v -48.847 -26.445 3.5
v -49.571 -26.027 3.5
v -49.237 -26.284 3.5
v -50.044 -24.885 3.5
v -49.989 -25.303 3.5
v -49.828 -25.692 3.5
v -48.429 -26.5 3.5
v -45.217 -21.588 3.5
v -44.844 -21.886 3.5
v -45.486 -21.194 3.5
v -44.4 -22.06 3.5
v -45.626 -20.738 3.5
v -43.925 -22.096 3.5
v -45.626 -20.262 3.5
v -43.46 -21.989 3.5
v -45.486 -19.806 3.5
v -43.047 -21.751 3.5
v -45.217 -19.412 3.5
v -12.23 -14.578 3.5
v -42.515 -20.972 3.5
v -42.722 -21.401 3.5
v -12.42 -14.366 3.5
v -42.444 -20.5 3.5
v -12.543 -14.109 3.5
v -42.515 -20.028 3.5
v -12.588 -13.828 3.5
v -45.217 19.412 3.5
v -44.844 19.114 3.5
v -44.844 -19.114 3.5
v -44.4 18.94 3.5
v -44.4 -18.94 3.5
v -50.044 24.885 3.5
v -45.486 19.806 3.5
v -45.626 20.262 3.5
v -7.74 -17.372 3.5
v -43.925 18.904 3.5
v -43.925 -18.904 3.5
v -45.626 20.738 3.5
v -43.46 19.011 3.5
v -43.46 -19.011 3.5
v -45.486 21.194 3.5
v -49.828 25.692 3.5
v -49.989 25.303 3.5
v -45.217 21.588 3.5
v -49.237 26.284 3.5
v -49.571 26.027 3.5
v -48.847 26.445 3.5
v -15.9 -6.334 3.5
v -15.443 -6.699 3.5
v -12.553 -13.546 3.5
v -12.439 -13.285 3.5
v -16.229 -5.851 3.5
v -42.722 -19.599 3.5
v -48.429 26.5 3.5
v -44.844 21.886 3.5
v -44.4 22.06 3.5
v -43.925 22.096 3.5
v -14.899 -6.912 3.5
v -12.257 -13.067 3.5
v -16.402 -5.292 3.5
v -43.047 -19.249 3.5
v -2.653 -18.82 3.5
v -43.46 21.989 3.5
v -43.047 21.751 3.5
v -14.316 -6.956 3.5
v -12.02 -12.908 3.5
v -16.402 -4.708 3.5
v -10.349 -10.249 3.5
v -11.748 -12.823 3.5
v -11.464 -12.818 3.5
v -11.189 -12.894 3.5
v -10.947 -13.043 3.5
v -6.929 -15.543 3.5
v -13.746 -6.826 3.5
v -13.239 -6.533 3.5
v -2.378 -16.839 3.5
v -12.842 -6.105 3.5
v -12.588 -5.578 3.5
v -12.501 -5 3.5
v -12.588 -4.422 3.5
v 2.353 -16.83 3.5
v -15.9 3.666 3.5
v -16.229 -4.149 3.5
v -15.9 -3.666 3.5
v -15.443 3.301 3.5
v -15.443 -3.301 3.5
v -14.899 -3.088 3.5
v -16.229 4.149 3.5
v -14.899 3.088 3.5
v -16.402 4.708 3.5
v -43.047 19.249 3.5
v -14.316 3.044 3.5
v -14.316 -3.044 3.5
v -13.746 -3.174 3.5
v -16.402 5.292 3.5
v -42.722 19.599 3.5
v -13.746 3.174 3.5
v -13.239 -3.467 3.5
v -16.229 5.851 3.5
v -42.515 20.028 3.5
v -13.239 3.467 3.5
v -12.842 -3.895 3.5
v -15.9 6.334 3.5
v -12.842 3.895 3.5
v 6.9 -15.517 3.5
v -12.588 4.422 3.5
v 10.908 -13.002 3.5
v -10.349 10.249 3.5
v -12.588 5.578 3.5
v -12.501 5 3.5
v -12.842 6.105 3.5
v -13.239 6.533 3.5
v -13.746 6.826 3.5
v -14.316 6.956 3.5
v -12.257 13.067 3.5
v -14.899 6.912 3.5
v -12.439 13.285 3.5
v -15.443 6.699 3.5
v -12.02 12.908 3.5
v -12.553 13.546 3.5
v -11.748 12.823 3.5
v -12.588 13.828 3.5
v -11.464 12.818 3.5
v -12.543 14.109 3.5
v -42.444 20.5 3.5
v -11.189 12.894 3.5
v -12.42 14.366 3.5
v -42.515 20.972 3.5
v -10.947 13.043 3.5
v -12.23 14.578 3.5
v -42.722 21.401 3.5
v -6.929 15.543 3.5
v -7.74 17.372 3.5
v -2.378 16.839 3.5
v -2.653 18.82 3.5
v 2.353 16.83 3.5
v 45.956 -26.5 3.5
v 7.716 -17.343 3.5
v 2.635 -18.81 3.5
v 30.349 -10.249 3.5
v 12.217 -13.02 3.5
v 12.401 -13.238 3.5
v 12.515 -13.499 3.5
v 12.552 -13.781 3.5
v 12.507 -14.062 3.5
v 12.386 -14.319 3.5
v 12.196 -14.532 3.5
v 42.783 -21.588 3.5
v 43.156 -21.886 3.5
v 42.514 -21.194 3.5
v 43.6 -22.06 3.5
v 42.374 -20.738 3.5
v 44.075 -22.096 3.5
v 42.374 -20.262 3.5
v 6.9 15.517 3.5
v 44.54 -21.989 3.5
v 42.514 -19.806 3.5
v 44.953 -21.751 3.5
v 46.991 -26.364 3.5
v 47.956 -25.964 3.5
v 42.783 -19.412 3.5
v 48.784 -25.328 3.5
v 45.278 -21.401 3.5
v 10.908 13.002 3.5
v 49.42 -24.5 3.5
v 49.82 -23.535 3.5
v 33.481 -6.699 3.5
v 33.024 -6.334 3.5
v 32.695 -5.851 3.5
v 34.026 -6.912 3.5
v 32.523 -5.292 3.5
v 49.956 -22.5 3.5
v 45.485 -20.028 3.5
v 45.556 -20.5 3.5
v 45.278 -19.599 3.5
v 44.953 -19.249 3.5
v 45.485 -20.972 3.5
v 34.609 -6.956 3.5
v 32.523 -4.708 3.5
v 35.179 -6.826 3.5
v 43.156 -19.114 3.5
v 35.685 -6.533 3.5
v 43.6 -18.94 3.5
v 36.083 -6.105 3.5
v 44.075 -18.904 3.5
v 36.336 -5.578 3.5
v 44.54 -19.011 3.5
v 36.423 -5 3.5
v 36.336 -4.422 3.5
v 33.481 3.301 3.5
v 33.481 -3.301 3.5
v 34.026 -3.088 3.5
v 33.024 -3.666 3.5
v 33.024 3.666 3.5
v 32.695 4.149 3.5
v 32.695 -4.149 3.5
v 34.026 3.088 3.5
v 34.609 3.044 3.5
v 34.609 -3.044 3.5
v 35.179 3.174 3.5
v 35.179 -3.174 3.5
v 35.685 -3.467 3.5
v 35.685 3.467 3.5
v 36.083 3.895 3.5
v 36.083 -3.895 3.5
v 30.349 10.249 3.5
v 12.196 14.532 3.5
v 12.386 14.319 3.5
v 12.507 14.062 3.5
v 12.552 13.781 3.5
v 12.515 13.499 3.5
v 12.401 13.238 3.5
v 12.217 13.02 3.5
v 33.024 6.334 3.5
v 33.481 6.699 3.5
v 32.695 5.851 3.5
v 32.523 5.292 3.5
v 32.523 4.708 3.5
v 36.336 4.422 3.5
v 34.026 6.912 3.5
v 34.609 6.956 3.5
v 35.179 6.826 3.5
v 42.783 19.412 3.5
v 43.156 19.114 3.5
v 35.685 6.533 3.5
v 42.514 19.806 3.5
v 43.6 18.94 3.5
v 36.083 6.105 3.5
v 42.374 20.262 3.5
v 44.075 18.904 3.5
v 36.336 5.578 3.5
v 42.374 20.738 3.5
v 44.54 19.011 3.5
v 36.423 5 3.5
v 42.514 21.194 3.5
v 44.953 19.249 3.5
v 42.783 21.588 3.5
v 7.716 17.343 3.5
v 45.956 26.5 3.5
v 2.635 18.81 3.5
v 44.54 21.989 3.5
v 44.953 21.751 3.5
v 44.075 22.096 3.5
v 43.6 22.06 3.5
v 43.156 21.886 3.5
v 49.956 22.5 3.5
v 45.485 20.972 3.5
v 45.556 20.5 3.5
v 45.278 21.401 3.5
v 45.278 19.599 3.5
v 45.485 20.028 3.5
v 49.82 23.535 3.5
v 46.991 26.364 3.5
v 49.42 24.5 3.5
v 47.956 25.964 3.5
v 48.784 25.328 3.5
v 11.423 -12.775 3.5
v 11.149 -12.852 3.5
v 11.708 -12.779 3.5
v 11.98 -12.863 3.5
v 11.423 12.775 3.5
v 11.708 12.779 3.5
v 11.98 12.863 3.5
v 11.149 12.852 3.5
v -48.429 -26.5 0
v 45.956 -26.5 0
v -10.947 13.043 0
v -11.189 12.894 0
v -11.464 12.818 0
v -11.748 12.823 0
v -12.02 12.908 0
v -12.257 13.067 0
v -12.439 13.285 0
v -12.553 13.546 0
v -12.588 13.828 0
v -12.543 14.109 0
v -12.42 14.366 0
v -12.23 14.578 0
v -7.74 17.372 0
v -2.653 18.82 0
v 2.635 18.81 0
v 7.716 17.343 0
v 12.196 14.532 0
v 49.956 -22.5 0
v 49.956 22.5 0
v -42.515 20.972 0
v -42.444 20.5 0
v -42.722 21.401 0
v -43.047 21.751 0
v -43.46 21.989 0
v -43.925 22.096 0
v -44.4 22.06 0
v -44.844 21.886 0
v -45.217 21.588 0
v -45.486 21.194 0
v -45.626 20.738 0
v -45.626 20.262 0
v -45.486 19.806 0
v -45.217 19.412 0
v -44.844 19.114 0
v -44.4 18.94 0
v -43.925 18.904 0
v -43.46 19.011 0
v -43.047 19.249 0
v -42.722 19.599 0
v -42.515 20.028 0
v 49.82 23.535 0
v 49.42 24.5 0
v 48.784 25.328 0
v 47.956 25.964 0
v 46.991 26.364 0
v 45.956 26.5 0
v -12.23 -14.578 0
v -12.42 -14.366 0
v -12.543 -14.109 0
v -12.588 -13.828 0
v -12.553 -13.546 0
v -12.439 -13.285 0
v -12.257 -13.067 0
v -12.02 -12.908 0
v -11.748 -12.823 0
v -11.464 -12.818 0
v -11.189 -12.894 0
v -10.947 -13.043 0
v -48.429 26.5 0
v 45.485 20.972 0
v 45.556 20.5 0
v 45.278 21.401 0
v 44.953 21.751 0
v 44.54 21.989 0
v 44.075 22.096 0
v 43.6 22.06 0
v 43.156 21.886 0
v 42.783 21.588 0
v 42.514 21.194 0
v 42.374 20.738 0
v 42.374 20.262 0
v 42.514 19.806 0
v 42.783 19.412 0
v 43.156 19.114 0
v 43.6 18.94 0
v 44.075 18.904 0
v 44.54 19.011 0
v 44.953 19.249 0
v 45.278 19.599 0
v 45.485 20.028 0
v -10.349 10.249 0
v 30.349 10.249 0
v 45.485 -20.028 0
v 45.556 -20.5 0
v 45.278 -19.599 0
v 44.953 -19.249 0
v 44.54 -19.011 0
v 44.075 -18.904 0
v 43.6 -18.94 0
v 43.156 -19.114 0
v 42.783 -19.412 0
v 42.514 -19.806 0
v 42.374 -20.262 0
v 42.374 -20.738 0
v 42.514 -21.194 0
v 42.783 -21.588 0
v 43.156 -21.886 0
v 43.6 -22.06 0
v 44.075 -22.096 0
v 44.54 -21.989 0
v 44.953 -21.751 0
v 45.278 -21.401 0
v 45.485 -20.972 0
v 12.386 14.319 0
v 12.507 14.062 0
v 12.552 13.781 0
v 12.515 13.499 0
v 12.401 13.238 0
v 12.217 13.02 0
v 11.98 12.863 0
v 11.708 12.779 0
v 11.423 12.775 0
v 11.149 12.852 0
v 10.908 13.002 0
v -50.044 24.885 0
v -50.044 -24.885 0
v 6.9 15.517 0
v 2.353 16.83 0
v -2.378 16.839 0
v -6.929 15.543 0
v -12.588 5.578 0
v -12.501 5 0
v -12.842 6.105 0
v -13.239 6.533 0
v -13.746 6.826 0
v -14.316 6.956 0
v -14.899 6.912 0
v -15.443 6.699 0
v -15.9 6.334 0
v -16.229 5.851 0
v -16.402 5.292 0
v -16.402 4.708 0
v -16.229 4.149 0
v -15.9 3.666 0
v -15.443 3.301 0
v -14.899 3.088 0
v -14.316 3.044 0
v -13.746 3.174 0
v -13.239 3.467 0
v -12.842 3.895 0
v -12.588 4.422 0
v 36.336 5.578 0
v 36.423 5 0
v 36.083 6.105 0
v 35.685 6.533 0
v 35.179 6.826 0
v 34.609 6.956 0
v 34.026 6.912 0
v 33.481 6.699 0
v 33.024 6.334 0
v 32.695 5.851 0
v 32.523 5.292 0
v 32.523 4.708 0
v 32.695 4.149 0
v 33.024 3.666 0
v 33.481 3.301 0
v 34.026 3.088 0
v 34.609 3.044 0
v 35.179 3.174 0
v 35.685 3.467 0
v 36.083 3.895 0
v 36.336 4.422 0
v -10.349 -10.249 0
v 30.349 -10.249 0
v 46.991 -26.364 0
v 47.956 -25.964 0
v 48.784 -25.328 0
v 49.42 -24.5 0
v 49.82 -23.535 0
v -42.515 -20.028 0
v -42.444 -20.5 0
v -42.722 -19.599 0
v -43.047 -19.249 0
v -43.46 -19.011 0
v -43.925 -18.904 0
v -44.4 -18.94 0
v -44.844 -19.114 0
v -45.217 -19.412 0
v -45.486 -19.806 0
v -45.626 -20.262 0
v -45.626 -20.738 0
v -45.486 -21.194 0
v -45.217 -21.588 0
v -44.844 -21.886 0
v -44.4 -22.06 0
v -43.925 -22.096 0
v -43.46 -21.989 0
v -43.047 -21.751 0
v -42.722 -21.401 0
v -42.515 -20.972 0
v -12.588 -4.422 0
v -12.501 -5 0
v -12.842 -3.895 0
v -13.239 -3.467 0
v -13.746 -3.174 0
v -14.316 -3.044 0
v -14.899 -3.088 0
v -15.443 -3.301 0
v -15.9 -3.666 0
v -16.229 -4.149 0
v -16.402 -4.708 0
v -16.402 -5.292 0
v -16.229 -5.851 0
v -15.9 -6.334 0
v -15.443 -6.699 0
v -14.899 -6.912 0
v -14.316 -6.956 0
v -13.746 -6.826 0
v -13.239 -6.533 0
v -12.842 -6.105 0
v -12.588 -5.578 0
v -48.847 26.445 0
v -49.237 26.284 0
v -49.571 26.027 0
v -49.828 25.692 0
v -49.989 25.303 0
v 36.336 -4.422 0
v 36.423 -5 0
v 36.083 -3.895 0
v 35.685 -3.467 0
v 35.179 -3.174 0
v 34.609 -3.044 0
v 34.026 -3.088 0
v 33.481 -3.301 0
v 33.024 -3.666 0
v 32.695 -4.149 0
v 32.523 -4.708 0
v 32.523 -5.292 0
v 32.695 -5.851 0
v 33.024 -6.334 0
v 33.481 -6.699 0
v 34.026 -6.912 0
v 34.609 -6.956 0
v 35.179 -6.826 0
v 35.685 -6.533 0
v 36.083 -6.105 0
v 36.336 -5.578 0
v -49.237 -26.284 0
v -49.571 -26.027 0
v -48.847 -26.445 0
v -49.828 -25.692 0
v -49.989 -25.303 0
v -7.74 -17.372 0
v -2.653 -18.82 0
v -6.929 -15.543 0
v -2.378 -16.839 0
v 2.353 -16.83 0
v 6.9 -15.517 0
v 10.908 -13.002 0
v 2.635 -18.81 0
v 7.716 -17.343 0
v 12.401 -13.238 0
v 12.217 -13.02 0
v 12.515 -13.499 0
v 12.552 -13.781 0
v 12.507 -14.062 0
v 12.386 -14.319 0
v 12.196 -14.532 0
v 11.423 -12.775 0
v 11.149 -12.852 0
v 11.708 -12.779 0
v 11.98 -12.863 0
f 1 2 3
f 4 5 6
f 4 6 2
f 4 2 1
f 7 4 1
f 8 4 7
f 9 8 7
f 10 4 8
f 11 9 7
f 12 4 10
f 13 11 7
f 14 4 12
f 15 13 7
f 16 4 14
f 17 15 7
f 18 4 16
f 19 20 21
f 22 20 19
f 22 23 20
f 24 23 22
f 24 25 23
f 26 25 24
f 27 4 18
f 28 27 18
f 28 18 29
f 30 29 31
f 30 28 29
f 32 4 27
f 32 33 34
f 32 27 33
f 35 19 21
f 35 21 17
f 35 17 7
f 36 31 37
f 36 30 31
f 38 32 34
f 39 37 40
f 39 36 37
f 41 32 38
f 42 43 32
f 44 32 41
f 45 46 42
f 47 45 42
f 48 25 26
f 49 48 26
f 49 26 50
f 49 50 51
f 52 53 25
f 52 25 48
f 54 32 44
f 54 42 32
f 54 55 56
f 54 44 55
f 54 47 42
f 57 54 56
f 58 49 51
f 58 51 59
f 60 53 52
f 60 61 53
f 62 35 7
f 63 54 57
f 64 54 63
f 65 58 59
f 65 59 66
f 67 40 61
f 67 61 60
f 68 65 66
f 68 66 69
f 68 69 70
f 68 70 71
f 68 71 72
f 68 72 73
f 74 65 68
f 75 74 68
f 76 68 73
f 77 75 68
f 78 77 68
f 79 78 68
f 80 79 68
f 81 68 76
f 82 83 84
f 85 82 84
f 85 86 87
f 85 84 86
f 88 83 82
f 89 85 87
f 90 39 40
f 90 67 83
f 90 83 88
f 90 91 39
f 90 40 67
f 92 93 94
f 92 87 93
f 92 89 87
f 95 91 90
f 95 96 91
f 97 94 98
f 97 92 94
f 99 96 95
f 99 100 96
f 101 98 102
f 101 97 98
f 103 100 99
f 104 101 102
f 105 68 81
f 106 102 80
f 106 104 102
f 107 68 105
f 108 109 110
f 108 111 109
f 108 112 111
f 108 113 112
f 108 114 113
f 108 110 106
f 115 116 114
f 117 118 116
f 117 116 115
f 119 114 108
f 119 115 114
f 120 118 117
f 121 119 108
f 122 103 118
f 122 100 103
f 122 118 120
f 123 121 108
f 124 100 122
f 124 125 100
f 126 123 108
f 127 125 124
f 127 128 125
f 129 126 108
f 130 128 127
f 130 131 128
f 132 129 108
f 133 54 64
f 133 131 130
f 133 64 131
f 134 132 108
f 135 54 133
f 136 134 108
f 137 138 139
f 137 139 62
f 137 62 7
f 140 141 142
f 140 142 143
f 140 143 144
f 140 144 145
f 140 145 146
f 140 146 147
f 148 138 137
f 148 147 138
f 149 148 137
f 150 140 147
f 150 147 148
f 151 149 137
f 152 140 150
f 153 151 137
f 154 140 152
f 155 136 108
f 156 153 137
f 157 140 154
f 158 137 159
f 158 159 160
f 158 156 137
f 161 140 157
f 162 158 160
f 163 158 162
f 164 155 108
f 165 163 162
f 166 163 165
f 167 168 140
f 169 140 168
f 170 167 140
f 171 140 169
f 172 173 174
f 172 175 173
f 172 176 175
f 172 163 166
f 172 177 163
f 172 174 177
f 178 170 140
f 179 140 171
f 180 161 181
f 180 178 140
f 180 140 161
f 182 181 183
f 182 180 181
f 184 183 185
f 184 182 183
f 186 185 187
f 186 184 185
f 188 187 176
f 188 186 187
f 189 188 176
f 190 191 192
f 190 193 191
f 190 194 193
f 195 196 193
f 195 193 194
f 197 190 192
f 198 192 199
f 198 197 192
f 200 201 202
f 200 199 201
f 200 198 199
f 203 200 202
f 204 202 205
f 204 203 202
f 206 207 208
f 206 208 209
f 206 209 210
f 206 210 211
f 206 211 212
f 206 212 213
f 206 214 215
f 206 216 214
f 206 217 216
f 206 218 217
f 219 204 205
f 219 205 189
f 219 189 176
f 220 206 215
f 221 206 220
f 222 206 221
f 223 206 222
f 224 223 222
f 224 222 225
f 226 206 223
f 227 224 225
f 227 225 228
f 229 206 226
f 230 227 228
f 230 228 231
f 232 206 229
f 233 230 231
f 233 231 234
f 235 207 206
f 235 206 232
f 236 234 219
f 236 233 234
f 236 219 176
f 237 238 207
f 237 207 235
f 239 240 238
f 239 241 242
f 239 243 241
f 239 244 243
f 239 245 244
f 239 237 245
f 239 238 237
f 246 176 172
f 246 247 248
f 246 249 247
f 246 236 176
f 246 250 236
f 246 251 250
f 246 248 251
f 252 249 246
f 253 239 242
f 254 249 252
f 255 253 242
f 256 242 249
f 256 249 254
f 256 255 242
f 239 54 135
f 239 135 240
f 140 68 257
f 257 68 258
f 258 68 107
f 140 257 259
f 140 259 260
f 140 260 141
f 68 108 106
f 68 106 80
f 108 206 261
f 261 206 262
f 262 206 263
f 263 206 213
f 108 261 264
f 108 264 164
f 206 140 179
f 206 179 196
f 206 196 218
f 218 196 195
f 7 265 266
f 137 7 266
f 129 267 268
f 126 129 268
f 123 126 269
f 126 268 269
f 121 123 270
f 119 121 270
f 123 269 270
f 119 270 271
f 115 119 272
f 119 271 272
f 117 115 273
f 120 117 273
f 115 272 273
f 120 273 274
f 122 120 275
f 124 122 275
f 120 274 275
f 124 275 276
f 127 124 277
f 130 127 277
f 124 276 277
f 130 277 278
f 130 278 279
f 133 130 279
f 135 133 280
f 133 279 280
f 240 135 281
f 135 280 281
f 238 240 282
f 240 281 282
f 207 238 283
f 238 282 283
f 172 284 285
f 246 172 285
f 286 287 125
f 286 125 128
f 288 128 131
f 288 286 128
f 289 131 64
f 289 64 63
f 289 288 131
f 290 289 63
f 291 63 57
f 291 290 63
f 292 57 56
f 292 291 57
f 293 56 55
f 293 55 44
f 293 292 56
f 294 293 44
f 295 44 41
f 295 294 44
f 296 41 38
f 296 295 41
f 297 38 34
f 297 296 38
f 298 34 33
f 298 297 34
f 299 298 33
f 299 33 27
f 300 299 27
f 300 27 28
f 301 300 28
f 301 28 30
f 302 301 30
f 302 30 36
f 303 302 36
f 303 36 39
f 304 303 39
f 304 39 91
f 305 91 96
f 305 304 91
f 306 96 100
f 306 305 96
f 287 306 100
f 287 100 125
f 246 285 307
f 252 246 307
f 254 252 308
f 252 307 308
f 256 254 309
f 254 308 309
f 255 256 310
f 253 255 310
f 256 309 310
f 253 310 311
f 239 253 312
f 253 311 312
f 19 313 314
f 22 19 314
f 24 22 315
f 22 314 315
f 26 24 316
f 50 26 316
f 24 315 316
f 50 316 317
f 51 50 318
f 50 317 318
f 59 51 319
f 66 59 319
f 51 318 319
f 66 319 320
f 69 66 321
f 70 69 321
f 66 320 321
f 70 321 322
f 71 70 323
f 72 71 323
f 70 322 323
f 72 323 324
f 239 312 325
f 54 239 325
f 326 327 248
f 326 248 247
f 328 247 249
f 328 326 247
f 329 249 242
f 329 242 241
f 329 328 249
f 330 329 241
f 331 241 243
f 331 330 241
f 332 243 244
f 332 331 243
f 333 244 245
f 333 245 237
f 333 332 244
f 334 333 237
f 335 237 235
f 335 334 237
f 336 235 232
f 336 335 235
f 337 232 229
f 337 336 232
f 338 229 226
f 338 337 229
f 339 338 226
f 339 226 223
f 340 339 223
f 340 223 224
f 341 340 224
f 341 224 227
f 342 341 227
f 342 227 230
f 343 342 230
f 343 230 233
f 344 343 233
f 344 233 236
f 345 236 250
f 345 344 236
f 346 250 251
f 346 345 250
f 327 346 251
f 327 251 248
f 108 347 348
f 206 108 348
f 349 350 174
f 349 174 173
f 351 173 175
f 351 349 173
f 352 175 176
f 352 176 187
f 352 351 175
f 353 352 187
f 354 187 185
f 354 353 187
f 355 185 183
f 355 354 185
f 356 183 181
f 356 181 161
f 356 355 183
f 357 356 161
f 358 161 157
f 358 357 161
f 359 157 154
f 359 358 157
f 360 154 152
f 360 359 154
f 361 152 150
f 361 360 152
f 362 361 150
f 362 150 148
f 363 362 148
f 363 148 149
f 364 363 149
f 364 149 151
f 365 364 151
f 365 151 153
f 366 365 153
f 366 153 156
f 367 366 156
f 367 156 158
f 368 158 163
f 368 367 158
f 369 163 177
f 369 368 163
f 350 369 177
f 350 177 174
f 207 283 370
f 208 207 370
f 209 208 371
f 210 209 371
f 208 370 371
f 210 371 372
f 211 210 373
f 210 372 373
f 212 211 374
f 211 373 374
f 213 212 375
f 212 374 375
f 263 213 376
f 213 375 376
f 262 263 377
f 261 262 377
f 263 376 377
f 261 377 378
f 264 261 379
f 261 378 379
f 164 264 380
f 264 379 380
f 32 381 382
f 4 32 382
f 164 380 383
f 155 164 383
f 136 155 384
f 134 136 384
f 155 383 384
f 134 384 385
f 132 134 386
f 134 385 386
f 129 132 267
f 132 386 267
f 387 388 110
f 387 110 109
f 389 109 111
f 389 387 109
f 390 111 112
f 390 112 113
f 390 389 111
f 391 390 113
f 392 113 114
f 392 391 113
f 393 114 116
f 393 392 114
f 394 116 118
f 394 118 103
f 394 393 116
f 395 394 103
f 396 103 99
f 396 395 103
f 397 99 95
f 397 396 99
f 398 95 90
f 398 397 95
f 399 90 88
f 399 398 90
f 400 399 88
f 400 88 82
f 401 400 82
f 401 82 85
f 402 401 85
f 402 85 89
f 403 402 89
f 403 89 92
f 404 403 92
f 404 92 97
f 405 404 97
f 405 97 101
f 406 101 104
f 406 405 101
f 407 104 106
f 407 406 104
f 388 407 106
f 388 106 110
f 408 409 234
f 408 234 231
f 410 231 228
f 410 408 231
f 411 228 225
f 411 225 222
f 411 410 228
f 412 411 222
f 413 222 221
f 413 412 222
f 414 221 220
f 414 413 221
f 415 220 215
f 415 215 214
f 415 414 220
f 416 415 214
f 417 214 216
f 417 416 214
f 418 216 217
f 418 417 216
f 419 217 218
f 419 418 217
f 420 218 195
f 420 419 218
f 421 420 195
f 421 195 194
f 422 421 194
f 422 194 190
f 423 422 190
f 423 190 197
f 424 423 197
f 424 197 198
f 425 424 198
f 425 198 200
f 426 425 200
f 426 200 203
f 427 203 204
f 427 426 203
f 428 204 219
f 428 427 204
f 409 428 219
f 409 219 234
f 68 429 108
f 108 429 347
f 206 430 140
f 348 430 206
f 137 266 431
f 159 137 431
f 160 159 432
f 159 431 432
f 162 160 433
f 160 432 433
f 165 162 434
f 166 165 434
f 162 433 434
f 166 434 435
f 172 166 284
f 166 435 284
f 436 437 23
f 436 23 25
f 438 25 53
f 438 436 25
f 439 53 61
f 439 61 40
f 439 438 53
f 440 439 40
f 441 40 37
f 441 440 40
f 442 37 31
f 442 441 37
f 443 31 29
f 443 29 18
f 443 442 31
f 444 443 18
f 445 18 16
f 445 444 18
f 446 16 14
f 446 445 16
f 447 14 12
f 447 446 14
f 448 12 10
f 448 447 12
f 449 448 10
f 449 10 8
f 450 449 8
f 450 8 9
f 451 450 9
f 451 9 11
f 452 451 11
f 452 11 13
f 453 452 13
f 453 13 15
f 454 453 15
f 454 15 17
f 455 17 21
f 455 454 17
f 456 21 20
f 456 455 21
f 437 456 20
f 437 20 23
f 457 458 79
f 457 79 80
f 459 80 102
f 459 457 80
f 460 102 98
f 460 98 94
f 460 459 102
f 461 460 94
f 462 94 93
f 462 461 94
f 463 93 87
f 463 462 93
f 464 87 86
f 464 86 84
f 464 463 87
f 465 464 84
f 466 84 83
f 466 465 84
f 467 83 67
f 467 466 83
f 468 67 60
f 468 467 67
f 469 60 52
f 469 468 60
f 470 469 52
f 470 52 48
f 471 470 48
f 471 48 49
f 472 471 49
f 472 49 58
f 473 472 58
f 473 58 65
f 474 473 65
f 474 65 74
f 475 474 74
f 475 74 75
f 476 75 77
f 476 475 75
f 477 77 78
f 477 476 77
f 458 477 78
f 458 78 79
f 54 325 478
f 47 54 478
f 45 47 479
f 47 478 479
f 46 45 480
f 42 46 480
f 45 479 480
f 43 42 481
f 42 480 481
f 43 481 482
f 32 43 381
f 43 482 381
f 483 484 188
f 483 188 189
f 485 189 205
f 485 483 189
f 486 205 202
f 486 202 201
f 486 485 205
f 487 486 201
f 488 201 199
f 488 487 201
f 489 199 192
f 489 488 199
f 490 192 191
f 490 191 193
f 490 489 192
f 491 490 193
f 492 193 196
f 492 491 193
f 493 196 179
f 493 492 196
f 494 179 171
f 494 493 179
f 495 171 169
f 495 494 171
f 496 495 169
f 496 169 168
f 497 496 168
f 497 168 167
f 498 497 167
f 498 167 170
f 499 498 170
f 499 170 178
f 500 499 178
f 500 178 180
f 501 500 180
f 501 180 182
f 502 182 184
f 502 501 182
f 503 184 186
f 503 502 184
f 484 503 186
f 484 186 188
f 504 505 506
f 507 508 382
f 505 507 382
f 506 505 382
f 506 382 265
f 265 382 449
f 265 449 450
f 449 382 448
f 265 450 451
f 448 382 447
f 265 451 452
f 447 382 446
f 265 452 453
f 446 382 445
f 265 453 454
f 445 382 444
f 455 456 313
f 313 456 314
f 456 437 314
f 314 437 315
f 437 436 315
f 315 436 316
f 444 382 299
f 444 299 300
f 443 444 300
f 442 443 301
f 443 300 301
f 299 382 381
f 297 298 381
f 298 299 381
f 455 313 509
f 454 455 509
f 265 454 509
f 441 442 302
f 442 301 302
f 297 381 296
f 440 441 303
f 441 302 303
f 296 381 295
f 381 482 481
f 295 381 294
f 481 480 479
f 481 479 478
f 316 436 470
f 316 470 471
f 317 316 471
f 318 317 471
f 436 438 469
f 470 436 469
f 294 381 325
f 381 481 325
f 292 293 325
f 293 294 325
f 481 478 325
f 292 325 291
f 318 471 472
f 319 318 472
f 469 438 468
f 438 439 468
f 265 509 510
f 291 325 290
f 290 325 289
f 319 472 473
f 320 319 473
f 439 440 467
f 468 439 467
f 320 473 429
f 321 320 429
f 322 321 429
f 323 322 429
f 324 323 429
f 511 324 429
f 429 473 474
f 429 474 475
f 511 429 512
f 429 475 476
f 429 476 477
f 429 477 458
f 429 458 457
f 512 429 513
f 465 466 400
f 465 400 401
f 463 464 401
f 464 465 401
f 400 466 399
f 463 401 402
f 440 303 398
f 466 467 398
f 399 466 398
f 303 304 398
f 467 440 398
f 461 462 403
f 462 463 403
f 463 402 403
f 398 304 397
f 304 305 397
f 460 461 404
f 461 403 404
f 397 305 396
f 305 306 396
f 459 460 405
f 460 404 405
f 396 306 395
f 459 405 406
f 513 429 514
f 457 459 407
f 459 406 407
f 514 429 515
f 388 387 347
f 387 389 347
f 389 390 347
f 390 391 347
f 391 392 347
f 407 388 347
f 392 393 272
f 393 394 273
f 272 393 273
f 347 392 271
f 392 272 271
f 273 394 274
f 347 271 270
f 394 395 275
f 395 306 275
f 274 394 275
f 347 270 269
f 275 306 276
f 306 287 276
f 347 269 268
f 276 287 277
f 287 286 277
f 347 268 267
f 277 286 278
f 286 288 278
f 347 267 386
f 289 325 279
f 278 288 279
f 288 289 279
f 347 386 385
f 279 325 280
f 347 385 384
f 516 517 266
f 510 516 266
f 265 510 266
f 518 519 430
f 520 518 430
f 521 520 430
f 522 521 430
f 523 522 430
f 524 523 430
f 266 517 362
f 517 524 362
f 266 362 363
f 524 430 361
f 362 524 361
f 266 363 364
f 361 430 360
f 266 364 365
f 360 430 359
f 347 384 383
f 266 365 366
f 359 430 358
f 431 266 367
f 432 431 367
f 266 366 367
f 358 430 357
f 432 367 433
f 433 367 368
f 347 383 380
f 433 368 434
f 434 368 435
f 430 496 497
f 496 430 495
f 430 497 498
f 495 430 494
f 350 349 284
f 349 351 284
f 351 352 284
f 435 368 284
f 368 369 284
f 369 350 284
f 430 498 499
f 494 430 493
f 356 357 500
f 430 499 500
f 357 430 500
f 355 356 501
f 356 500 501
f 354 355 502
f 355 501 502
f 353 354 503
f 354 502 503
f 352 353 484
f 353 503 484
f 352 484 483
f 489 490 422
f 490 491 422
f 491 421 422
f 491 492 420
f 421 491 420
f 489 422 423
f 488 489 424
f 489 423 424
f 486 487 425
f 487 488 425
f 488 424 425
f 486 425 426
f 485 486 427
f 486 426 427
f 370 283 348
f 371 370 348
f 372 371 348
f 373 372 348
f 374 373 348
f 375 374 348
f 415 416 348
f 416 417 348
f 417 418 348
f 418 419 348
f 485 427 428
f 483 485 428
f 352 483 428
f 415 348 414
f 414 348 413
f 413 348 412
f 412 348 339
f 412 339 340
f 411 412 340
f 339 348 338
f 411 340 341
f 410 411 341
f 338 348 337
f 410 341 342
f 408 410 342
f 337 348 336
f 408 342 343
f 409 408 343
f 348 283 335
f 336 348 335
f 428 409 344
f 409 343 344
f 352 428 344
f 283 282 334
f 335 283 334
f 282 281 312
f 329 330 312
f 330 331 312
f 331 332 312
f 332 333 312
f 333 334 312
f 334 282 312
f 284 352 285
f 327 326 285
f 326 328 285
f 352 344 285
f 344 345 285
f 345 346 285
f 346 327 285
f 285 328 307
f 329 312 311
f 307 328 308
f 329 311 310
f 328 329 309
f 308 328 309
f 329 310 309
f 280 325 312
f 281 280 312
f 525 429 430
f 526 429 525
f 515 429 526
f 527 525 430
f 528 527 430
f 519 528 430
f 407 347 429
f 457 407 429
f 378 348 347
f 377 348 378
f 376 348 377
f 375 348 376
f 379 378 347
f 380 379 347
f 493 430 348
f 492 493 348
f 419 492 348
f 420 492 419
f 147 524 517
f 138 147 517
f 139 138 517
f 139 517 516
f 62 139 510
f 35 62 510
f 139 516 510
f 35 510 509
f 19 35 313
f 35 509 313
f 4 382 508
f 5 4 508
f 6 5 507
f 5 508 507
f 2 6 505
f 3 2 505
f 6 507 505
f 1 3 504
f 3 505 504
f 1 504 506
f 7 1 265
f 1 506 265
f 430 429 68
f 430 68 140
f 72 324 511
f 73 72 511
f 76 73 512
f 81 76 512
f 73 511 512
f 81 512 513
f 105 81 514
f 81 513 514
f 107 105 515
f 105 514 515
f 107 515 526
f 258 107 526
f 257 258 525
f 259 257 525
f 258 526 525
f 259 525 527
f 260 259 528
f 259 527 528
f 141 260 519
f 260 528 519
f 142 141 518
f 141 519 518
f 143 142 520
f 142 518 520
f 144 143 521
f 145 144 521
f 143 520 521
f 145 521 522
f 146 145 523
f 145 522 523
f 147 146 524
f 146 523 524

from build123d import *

# Parameters (mm, degrees)
SKETCH1_R           = 1.6
SKETCH1_R_2         = 1.961338098
SKETCH1_W           = 40.698202598
SKETCH1_H           = 20.498202598
BOSS_EXTRUDE1_DEPTH = 3.5


with BuildPart() as part:
    # Sketch1 → Boss-Extrude1 (new body)
    with BuildSketch(Plane.XY):
        with BuildLine():
            ThreePointArc((-50.044200549, -24.884800983), (-49.571119709, -26.026919161), (-48.429001531, -26.5))
            Line((-48.429001531, -26.5), (45.955799451, -26.5))
            ThreePointArc((45.955799451, -26.5), (48.784226576, -25.328427125), (49.955799451, -22.5))
            Line((49.955799451, -22.5), (49.955799451, 22.5))
            ThreePointArc((49.955799451, 22.5), (48.784226576, 25.328427125), (45.955799451, 26.5))
            Line((45.955799451, 26.5), (-48.429001531, 26.5))
            ThreePointArc((-48.429001531, 26.5), (-49.571119709, 26.026919161), (-50.044200549, 24.884800983))
            Line((-50.044200549, 24.884800983), (-50.044200549, -24.884800983))
        make_face()
        with Locations((-44.044200549, -20.5)):
            Circle(SKETCH1_R, mode=Mode.SUBTRACT)
        with Locations((-14.462088638, -5)):
            Circle(SKETCH1_R_2, mode=Mode.SUBTRACT)
        with BuildLine():
            ThreePointArc((12.196121371, -14.531845007), (-0.008459876, -18.999966384), (-12.229764581, -14.57779233))
            ThreePointArc((-12.229764581, -14.57779233), (-12.355671334, -13.169194626), (-10.94707363, -13.043287874))
            ThreePointArc((-10.94707363, -13.043287874), (-0.012222052, -16.999969923), (10.907666432, -13.002177111))
            ThreePointArc((10.907666432, -13.002177111), (12.31672785, -13.122783589), (12.196121371, -14.531845007))
        make_face(mode=Mode.SUBTRACT)
        with Locations((43.955799451, -20.5)):
            Circle(SKETCH1_R, mode=Mode.SUBTRACT)
        with Locations((10, 0)):
            Rectangle(SKETCH1_W, SKETCH1_H, mode=Mode.SUBTRACT)
        with Locations((34.462088638, -5)):
            Circle(SKETCH1_R_2, mode=Mode.SUBTRACT)
        with Locations((-14.462088638, 5)):
            Circle(SKETCH1_R_2, mode=Mode.SUBTRACT)
        with Locations((-44.044200549, 20.5)):
            Circle(SKETCH1_R, mode=Mode.SUBTRACT)
        with Locations((34.462088638, 5)):
            Circle(SKETCH1_R_2, mode=Mode.SUBTRACT)
        with BuildLine():
            ThreePointArc((-10.94707363, 13.043287874), (-12.355671334, 13.169194626), (-12.229764581, 14.57779233))
            ThreePointArc((-12.229764581, 14.57779233), (-0.008459876, 18.999966384), (12.196121371, 14.531845007))
            ThreePointArc((12.196121371, 14.531845007), (12.31672785, 13.122783589), (10.907666432, 13.002177111))
            ThreePointArc((10.907666432, 13.002177111), (-0.012222052, 16.999969923), (-10.94707363, 13.043287874))
        make_face(mode=Mode.SUBTRACT)
        with Locations((43.955799451, 20.5)):
            Circle(SKETCH1_R, mode=Mode.SUBTRACT)
    extrude(amount=BOSS_EXTRUDE1_DEPTH)


solid = part.part
